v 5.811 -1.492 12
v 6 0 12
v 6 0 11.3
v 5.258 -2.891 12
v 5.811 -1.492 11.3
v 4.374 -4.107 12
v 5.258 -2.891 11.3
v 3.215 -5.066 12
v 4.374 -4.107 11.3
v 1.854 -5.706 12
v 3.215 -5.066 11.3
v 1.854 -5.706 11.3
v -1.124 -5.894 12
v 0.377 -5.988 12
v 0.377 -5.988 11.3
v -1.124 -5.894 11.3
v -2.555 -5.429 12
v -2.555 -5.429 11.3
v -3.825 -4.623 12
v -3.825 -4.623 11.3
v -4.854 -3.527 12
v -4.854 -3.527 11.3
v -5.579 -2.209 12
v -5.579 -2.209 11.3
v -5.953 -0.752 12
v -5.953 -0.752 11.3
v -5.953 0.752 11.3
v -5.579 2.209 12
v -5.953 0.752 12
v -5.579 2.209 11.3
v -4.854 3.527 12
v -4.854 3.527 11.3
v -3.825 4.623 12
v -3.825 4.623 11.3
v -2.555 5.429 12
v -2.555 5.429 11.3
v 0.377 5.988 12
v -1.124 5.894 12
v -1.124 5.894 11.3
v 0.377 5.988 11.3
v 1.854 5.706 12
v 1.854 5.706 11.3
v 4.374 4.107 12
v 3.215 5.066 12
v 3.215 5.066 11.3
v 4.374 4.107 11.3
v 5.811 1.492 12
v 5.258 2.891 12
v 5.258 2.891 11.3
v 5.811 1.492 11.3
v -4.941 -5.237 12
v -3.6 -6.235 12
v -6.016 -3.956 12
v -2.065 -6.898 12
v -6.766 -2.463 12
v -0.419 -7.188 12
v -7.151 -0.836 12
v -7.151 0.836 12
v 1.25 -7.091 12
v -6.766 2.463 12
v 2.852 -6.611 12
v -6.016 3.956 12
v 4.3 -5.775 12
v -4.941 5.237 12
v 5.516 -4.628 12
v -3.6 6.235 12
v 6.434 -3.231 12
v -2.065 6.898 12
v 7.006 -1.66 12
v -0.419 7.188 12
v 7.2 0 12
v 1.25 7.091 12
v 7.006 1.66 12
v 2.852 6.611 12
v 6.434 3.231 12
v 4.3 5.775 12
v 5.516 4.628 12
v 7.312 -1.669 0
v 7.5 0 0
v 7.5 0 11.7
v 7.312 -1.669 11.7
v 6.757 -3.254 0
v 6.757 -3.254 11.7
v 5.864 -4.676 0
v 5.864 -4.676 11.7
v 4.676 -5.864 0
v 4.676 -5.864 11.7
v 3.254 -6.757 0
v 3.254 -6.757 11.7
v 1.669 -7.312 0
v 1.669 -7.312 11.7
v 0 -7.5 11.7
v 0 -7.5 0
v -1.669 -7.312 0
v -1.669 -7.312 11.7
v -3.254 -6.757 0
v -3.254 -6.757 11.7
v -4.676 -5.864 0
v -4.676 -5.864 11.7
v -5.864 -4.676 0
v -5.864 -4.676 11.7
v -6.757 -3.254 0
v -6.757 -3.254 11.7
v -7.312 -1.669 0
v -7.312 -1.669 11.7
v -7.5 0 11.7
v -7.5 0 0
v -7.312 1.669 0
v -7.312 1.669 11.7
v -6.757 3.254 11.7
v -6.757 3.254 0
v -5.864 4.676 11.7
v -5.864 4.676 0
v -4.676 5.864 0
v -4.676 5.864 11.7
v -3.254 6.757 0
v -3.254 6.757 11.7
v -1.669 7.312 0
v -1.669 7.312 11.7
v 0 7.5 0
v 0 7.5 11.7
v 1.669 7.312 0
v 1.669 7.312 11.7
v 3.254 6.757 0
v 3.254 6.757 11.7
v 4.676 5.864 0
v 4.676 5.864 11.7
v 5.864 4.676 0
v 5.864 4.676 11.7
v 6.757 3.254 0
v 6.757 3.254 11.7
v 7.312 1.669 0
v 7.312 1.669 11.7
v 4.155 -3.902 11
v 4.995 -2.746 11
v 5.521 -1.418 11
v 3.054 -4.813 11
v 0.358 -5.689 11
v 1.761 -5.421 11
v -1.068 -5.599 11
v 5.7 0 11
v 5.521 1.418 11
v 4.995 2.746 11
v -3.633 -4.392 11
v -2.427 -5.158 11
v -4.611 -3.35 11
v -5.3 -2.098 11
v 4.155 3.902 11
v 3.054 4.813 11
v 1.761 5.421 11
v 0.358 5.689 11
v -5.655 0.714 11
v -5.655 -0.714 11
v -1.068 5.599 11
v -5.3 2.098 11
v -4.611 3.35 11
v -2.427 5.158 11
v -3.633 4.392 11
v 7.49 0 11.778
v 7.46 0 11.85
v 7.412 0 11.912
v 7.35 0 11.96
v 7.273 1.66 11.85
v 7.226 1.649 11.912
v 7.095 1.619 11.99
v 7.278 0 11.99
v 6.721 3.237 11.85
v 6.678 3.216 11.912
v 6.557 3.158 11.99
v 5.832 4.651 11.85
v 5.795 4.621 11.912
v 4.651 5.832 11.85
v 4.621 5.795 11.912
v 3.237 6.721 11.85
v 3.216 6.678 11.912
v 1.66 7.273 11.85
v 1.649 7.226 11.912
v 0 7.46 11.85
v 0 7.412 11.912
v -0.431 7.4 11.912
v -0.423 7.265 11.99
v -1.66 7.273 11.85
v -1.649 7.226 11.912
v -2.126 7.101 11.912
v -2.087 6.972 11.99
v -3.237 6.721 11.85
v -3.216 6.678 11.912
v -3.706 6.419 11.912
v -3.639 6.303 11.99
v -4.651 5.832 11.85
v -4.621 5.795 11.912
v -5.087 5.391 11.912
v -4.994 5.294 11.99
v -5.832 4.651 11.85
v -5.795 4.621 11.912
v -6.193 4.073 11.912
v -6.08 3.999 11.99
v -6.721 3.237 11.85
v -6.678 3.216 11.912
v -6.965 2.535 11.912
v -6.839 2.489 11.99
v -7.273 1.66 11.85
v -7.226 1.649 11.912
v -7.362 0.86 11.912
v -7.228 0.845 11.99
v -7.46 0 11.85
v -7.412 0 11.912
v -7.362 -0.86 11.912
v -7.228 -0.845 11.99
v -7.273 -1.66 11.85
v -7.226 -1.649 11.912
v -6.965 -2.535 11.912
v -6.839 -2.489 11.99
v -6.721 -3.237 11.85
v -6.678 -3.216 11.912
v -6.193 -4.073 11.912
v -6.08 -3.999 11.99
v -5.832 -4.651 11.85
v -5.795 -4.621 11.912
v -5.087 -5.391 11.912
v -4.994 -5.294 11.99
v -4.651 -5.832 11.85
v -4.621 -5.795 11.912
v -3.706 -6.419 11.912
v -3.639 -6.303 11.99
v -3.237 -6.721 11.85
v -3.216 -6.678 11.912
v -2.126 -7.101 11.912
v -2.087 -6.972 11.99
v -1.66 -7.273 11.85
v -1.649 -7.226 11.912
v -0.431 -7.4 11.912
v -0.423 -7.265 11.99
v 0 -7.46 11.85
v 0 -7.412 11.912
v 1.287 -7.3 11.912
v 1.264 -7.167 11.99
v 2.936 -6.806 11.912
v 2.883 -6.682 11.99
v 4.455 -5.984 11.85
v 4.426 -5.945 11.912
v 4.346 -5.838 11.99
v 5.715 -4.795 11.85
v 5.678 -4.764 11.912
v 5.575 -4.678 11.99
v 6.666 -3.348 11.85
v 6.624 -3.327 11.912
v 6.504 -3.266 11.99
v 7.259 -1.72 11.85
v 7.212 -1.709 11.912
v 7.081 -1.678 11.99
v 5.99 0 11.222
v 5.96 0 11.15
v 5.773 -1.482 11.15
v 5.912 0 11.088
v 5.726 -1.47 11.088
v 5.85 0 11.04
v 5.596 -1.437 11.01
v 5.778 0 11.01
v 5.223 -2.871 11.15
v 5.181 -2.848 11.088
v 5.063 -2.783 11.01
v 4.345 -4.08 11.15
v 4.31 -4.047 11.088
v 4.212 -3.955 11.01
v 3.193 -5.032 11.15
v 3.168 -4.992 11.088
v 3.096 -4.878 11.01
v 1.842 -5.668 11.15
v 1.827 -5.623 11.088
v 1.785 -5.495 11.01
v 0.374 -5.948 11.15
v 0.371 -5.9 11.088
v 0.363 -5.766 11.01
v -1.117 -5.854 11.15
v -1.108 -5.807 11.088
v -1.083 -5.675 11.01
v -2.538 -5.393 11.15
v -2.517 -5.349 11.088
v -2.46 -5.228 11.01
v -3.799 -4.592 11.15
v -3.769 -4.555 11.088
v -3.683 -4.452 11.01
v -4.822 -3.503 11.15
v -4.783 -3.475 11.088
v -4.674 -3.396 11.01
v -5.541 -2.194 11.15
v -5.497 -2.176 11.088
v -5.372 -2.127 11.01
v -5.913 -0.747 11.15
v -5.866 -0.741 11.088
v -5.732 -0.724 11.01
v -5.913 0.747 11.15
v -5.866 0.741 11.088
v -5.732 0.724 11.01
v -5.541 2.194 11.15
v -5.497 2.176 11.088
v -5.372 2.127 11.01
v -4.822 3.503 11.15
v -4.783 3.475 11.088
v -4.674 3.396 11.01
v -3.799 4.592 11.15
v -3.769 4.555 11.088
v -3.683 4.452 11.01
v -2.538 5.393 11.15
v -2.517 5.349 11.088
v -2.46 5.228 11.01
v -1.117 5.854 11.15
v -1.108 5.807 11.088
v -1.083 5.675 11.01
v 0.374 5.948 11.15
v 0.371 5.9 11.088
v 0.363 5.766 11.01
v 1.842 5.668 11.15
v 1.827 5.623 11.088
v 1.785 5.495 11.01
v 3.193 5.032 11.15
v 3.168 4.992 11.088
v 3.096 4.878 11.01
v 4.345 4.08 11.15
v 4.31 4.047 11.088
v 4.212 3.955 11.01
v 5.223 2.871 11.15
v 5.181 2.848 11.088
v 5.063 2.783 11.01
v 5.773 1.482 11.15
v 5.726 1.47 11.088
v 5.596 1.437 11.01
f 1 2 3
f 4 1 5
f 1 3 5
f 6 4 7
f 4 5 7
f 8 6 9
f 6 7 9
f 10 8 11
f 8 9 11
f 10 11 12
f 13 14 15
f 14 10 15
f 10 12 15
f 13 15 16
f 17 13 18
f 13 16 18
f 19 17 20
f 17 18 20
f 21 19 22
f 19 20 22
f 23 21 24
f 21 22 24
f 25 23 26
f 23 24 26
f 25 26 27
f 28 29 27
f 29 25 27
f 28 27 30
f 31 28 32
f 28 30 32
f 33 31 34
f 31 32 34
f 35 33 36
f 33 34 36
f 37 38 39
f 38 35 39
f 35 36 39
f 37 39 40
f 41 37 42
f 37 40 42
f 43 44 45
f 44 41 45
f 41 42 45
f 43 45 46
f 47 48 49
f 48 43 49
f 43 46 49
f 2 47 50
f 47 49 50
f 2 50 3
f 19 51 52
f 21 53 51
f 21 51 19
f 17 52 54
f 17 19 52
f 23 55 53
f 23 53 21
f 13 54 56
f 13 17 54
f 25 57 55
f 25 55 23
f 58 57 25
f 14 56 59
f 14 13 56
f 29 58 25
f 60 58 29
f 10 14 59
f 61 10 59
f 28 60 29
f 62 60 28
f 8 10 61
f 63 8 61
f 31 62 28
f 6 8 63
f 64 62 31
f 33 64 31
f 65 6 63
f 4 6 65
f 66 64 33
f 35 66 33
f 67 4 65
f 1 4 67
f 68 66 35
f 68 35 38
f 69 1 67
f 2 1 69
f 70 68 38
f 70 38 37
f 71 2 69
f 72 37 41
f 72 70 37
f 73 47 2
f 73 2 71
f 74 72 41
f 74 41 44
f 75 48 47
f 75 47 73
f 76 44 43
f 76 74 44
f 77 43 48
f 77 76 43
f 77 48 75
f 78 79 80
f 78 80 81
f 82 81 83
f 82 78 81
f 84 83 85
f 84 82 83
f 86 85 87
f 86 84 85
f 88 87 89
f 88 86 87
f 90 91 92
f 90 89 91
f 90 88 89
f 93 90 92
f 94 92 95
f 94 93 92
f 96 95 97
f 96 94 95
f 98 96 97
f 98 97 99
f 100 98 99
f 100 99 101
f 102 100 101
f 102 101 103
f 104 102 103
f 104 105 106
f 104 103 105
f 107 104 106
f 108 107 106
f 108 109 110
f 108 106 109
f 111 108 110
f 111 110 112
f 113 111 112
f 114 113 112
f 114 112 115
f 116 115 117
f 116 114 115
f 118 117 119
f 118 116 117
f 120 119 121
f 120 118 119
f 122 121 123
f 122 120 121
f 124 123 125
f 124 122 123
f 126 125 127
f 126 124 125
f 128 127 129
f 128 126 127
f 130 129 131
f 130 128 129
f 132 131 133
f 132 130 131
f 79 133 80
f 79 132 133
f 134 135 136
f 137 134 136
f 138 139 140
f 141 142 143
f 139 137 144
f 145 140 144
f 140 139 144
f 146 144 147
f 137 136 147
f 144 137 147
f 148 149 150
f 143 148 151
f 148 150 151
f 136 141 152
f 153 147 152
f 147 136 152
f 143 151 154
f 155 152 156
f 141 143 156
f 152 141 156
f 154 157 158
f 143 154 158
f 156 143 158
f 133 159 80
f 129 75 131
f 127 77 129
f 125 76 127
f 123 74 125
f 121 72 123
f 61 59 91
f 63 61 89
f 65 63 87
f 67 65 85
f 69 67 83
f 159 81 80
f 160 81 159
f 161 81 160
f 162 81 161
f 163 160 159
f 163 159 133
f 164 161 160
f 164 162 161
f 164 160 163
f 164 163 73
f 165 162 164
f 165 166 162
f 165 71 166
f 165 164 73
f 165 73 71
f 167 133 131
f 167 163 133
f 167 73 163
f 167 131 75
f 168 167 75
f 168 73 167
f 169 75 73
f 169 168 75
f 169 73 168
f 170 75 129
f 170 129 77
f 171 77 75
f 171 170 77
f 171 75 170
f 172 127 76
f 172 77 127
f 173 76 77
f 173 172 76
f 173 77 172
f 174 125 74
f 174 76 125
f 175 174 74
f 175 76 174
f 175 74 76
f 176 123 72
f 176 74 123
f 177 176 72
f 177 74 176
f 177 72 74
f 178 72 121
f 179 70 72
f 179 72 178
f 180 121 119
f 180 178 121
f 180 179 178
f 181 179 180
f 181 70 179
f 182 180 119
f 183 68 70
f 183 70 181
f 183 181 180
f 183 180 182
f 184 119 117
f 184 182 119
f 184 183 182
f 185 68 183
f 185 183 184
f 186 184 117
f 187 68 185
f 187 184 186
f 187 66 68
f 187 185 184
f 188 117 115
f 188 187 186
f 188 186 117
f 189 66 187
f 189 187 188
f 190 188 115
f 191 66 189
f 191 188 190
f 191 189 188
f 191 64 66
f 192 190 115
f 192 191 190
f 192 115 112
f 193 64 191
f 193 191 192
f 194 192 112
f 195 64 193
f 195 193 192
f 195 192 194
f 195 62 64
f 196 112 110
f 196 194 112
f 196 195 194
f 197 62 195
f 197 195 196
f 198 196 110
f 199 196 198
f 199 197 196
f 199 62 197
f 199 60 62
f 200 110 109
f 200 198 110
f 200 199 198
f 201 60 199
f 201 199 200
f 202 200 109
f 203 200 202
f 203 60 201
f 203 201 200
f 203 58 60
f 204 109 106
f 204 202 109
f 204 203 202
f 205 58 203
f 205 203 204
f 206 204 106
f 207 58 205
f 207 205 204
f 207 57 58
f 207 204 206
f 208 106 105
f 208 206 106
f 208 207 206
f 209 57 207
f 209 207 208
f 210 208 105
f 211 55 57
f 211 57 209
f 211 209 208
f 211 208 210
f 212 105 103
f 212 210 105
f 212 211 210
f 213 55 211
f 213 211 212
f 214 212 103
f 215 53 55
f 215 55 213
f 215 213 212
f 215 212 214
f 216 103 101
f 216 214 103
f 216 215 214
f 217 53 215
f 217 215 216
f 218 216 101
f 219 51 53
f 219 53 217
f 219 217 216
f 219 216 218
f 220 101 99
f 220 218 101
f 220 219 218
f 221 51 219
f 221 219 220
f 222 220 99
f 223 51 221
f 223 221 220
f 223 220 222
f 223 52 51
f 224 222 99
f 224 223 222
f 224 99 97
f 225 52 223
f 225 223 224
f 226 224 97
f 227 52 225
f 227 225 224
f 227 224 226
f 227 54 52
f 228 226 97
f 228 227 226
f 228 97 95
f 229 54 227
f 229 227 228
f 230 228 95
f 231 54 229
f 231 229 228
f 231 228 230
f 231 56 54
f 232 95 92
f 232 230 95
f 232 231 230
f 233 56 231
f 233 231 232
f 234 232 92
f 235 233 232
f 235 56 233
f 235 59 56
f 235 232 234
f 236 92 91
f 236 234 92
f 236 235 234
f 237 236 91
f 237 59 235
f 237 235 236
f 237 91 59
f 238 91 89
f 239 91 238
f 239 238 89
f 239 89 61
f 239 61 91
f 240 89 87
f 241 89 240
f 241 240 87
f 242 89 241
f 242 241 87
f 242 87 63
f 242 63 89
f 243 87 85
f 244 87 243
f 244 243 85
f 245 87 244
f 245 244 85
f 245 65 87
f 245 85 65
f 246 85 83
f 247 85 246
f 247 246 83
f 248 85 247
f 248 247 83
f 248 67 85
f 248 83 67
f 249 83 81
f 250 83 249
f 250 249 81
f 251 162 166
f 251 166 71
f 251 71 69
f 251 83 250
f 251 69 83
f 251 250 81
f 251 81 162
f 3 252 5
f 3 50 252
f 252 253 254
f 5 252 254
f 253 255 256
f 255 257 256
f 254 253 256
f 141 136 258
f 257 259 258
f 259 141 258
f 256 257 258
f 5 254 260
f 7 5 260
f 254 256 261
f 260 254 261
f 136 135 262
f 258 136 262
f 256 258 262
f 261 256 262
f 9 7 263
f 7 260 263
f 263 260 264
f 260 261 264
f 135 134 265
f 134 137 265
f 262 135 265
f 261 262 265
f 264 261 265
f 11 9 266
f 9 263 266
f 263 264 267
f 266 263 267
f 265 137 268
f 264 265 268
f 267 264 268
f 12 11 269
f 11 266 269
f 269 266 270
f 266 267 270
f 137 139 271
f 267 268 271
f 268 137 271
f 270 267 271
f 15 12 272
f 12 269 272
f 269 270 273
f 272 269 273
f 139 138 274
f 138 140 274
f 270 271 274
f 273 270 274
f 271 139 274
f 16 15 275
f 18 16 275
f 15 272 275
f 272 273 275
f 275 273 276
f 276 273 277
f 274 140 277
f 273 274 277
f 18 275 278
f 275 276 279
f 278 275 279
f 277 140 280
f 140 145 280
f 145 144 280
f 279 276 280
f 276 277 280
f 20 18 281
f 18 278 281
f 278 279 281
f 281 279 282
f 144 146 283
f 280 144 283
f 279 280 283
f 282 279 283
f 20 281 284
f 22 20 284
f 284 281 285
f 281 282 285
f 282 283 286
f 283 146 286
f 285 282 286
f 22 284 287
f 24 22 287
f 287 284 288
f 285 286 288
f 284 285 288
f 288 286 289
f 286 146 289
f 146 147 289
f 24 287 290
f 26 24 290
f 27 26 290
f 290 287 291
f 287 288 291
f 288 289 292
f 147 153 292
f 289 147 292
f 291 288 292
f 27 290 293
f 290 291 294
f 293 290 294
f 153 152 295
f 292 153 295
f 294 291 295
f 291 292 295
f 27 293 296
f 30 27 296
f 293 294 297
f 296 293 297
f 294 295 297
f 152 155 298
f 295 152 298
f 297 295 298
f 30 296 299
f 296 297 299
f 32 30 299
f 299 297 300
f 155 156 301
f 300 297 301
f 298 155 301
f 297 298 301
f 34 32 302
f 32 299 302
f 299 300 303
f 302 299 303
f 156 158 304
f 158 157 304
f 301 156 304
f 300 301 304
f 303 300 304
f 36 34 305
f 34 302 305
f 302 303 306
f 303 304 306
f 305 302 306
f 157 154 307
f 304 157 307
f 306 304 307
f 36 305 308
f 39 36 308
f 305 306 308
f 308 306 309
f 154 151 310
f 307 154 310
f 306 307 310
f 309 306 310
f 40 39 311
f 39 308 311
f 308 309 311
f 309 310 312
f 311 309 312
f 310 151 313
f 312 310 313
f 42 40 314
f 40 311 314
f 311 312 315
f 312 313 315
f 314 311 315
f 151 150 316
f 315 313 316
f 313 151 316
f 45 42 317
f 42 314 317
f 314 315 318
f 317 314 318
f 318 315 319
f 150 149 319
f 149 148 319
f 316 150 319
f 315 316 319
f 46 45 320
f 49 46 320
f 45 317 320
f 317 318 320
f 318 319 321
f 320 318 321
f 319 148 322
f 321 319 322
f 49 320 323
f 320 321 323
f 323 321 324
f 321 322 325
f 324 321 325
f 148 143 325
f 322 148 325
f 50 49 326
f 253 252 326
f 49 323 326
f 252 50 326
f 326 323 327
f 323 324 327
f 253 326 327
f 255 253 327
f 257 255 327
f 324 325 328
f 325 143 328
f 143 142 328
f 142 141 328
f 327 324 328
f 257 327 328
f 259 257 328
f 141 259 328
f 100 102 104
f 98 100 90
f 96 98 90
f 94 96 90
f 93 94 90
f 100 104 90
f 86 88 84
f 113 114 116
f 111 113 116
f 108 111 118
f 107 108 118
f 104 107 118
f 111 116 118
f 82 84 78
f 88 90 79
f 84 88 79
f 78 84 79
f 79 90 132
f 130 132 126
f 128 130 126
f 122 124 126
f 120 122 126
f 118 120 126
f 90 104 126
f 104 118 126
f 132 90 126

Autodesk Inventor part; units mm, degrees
ref_plane "YZ Plane" through (0, 0, 0) normal (1, 0, 0) x (0, 1, 0)
ref_plane "XZ Plane" through (0, 0, 0) normal (0, 1, 0) x (-1, 0, 0)
ref_plane "XY Plane" through (0, 0, 0) normal (0, 0, 1) x (1, 0, 0)
sketch "Esboço1" plane through (0, 0, 0) normal (0, 0, 1) x (1, 0, 0)
  circle A0 centre (0, 0) radius 7.5
  circle A1 centre (0, 0) radius 6
  dimension "d0" = 15
  dimension "d1" = 12
extrude "Extrusão1" add sketch "Esboço1" along normal blind 12
sketch "Esboço2" plane through (0, 0, 0) normal (0, 0, -1) x (-1, 0, 0)
  circle A0 centre (0, 0) radius 6
extrude "Extrusão2" add sketch "Esboço2" against normal blind 11
fillet "Arredondamento1" radius 0.3 2 edges at (-7.5, 0, 12) (-6, 0, 11)
properties part number "Caixa"
